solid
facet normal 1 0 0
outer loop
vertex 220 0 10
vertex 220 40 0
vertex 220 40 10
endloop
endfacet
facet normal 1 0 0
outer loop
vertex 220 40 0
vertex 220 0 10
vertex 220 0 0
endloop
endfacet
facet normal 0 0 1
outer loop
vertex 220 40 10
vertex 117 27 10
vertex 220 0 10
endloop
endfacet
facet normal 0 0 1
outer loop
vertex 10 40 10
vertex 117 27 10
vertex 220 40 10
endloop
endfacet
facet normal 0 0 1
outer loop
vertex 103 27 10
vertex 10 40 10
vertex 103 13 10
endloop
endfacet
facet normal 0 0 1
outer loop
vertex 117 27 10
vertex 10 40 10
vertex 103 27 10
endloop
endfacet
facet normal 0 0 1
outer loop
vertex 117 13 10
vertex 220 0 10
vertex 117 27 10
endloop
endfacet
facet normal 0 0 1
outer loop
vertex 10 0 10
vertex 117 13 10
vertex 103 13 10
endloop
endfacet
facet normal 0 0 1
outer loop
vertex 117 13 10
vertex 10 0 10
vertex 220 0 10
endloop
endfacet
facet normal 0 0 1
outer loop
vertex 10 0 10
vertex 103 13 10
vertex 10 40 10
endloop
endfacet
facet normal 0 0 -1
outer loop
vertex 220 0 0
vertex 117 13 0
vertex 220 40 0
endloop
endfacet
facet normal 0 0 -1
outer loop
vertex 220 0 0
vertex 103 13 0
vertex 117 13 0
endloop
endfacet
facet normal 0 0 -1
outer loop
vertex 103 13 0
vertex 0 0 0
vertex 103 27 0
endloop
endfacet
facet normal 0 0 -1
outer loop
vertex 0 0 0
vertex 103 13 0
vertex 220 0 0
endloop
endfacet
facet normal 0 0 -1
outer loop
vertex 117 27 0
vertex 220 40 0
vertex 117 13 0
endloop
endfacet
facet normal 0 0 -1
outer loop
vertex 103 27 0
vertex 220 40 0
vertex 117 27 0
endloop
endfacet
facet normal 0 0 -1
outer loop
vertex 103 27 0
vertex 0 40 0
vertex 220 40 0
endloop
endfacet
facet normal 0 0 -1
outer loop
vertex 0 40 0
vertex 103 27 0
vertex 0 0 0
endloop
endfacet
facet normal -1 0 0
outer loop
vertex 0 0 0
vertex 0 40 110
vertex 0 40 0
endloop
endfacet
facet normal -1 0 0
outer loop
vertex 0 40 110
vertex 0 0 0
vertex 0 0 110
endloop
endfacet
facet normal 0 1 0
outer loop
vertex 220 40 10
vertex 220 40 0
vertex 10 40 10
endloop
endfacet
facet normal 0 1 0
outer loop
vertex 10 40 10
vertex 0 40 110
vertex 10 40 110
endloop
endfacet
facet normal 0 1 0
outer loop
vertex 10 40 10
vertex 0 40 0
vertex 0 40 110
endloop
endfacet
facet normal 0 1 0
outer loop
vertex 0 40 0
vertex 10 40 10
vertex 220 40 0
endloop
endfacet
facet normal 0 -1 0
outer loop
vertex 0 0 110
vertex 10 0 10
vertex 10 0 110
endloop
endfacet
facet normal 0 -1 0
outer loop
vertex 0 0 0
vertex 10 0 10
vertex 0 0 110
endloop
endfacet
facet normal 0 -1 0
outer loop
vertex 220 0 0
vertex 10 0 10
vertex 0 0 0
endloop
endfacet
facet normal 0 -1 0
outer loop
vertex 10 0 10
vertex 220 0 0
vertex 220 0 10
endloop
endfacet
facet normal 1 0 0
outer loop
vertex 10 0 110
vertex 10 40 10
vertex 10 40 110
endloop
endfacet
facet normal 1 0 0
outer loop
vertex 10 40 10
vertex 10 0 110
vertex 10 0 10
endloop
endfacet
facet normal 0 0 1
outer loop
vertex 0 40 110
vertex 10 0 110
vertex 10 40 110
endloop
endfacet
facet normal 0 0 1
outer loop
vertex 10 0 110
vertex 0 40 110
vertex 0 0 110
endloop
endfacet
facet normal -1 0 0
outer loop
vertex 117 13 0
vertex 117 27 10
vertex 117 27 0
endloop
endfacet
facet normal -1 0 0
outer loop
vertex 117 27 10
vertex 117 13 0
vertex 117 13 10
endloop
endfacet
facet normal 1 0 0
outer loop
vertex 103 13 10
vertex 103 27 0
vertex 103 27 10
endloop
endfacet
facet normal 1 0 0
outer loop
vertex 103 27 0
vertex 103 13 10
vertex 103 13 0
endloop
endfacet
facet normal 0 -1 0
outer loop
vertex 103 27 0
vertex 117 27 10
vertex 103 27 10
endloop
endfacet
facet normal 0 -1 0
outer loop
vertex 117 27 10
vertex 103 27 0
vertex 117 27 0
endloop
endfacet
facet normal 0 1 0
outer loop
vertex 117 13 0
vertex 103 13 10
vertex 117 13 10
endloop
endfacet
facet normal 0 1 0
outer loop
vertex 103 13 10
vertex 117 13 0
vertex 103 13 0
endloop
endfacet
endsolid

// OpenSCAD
$fn = 32;

// ----------------------------------------------------------------------
// Gantry bracket: 200-250 mm L bracket
// ----------------------------------------------------------------------

// --- parameters (mm) ---
base_l = 220;             // base arm length, X
arm_w = 40;               // arm width, Y
thick = 10;               // arm thickness
up_h = 100;               // vertical arm height, Z
slot_w = 14;              // adjustment slot width in the base
fit_tol = 0.02;           // tolerance for press fits, mm
free_tol = 0.2;           // tolerance for clearance fits, mm

total_h = up_h + thick;  // overall height

difference() {
  union() {
    cube([base_l, arm_w, thick]);
    cube([thick, arm_w, total_h]);
  }
  translate([base_l / 2 - slot_w / 2, arm_w / 2 - slot_w / 2, -1])
    cube([slot_w, slot_w, thick + 2]);
}
